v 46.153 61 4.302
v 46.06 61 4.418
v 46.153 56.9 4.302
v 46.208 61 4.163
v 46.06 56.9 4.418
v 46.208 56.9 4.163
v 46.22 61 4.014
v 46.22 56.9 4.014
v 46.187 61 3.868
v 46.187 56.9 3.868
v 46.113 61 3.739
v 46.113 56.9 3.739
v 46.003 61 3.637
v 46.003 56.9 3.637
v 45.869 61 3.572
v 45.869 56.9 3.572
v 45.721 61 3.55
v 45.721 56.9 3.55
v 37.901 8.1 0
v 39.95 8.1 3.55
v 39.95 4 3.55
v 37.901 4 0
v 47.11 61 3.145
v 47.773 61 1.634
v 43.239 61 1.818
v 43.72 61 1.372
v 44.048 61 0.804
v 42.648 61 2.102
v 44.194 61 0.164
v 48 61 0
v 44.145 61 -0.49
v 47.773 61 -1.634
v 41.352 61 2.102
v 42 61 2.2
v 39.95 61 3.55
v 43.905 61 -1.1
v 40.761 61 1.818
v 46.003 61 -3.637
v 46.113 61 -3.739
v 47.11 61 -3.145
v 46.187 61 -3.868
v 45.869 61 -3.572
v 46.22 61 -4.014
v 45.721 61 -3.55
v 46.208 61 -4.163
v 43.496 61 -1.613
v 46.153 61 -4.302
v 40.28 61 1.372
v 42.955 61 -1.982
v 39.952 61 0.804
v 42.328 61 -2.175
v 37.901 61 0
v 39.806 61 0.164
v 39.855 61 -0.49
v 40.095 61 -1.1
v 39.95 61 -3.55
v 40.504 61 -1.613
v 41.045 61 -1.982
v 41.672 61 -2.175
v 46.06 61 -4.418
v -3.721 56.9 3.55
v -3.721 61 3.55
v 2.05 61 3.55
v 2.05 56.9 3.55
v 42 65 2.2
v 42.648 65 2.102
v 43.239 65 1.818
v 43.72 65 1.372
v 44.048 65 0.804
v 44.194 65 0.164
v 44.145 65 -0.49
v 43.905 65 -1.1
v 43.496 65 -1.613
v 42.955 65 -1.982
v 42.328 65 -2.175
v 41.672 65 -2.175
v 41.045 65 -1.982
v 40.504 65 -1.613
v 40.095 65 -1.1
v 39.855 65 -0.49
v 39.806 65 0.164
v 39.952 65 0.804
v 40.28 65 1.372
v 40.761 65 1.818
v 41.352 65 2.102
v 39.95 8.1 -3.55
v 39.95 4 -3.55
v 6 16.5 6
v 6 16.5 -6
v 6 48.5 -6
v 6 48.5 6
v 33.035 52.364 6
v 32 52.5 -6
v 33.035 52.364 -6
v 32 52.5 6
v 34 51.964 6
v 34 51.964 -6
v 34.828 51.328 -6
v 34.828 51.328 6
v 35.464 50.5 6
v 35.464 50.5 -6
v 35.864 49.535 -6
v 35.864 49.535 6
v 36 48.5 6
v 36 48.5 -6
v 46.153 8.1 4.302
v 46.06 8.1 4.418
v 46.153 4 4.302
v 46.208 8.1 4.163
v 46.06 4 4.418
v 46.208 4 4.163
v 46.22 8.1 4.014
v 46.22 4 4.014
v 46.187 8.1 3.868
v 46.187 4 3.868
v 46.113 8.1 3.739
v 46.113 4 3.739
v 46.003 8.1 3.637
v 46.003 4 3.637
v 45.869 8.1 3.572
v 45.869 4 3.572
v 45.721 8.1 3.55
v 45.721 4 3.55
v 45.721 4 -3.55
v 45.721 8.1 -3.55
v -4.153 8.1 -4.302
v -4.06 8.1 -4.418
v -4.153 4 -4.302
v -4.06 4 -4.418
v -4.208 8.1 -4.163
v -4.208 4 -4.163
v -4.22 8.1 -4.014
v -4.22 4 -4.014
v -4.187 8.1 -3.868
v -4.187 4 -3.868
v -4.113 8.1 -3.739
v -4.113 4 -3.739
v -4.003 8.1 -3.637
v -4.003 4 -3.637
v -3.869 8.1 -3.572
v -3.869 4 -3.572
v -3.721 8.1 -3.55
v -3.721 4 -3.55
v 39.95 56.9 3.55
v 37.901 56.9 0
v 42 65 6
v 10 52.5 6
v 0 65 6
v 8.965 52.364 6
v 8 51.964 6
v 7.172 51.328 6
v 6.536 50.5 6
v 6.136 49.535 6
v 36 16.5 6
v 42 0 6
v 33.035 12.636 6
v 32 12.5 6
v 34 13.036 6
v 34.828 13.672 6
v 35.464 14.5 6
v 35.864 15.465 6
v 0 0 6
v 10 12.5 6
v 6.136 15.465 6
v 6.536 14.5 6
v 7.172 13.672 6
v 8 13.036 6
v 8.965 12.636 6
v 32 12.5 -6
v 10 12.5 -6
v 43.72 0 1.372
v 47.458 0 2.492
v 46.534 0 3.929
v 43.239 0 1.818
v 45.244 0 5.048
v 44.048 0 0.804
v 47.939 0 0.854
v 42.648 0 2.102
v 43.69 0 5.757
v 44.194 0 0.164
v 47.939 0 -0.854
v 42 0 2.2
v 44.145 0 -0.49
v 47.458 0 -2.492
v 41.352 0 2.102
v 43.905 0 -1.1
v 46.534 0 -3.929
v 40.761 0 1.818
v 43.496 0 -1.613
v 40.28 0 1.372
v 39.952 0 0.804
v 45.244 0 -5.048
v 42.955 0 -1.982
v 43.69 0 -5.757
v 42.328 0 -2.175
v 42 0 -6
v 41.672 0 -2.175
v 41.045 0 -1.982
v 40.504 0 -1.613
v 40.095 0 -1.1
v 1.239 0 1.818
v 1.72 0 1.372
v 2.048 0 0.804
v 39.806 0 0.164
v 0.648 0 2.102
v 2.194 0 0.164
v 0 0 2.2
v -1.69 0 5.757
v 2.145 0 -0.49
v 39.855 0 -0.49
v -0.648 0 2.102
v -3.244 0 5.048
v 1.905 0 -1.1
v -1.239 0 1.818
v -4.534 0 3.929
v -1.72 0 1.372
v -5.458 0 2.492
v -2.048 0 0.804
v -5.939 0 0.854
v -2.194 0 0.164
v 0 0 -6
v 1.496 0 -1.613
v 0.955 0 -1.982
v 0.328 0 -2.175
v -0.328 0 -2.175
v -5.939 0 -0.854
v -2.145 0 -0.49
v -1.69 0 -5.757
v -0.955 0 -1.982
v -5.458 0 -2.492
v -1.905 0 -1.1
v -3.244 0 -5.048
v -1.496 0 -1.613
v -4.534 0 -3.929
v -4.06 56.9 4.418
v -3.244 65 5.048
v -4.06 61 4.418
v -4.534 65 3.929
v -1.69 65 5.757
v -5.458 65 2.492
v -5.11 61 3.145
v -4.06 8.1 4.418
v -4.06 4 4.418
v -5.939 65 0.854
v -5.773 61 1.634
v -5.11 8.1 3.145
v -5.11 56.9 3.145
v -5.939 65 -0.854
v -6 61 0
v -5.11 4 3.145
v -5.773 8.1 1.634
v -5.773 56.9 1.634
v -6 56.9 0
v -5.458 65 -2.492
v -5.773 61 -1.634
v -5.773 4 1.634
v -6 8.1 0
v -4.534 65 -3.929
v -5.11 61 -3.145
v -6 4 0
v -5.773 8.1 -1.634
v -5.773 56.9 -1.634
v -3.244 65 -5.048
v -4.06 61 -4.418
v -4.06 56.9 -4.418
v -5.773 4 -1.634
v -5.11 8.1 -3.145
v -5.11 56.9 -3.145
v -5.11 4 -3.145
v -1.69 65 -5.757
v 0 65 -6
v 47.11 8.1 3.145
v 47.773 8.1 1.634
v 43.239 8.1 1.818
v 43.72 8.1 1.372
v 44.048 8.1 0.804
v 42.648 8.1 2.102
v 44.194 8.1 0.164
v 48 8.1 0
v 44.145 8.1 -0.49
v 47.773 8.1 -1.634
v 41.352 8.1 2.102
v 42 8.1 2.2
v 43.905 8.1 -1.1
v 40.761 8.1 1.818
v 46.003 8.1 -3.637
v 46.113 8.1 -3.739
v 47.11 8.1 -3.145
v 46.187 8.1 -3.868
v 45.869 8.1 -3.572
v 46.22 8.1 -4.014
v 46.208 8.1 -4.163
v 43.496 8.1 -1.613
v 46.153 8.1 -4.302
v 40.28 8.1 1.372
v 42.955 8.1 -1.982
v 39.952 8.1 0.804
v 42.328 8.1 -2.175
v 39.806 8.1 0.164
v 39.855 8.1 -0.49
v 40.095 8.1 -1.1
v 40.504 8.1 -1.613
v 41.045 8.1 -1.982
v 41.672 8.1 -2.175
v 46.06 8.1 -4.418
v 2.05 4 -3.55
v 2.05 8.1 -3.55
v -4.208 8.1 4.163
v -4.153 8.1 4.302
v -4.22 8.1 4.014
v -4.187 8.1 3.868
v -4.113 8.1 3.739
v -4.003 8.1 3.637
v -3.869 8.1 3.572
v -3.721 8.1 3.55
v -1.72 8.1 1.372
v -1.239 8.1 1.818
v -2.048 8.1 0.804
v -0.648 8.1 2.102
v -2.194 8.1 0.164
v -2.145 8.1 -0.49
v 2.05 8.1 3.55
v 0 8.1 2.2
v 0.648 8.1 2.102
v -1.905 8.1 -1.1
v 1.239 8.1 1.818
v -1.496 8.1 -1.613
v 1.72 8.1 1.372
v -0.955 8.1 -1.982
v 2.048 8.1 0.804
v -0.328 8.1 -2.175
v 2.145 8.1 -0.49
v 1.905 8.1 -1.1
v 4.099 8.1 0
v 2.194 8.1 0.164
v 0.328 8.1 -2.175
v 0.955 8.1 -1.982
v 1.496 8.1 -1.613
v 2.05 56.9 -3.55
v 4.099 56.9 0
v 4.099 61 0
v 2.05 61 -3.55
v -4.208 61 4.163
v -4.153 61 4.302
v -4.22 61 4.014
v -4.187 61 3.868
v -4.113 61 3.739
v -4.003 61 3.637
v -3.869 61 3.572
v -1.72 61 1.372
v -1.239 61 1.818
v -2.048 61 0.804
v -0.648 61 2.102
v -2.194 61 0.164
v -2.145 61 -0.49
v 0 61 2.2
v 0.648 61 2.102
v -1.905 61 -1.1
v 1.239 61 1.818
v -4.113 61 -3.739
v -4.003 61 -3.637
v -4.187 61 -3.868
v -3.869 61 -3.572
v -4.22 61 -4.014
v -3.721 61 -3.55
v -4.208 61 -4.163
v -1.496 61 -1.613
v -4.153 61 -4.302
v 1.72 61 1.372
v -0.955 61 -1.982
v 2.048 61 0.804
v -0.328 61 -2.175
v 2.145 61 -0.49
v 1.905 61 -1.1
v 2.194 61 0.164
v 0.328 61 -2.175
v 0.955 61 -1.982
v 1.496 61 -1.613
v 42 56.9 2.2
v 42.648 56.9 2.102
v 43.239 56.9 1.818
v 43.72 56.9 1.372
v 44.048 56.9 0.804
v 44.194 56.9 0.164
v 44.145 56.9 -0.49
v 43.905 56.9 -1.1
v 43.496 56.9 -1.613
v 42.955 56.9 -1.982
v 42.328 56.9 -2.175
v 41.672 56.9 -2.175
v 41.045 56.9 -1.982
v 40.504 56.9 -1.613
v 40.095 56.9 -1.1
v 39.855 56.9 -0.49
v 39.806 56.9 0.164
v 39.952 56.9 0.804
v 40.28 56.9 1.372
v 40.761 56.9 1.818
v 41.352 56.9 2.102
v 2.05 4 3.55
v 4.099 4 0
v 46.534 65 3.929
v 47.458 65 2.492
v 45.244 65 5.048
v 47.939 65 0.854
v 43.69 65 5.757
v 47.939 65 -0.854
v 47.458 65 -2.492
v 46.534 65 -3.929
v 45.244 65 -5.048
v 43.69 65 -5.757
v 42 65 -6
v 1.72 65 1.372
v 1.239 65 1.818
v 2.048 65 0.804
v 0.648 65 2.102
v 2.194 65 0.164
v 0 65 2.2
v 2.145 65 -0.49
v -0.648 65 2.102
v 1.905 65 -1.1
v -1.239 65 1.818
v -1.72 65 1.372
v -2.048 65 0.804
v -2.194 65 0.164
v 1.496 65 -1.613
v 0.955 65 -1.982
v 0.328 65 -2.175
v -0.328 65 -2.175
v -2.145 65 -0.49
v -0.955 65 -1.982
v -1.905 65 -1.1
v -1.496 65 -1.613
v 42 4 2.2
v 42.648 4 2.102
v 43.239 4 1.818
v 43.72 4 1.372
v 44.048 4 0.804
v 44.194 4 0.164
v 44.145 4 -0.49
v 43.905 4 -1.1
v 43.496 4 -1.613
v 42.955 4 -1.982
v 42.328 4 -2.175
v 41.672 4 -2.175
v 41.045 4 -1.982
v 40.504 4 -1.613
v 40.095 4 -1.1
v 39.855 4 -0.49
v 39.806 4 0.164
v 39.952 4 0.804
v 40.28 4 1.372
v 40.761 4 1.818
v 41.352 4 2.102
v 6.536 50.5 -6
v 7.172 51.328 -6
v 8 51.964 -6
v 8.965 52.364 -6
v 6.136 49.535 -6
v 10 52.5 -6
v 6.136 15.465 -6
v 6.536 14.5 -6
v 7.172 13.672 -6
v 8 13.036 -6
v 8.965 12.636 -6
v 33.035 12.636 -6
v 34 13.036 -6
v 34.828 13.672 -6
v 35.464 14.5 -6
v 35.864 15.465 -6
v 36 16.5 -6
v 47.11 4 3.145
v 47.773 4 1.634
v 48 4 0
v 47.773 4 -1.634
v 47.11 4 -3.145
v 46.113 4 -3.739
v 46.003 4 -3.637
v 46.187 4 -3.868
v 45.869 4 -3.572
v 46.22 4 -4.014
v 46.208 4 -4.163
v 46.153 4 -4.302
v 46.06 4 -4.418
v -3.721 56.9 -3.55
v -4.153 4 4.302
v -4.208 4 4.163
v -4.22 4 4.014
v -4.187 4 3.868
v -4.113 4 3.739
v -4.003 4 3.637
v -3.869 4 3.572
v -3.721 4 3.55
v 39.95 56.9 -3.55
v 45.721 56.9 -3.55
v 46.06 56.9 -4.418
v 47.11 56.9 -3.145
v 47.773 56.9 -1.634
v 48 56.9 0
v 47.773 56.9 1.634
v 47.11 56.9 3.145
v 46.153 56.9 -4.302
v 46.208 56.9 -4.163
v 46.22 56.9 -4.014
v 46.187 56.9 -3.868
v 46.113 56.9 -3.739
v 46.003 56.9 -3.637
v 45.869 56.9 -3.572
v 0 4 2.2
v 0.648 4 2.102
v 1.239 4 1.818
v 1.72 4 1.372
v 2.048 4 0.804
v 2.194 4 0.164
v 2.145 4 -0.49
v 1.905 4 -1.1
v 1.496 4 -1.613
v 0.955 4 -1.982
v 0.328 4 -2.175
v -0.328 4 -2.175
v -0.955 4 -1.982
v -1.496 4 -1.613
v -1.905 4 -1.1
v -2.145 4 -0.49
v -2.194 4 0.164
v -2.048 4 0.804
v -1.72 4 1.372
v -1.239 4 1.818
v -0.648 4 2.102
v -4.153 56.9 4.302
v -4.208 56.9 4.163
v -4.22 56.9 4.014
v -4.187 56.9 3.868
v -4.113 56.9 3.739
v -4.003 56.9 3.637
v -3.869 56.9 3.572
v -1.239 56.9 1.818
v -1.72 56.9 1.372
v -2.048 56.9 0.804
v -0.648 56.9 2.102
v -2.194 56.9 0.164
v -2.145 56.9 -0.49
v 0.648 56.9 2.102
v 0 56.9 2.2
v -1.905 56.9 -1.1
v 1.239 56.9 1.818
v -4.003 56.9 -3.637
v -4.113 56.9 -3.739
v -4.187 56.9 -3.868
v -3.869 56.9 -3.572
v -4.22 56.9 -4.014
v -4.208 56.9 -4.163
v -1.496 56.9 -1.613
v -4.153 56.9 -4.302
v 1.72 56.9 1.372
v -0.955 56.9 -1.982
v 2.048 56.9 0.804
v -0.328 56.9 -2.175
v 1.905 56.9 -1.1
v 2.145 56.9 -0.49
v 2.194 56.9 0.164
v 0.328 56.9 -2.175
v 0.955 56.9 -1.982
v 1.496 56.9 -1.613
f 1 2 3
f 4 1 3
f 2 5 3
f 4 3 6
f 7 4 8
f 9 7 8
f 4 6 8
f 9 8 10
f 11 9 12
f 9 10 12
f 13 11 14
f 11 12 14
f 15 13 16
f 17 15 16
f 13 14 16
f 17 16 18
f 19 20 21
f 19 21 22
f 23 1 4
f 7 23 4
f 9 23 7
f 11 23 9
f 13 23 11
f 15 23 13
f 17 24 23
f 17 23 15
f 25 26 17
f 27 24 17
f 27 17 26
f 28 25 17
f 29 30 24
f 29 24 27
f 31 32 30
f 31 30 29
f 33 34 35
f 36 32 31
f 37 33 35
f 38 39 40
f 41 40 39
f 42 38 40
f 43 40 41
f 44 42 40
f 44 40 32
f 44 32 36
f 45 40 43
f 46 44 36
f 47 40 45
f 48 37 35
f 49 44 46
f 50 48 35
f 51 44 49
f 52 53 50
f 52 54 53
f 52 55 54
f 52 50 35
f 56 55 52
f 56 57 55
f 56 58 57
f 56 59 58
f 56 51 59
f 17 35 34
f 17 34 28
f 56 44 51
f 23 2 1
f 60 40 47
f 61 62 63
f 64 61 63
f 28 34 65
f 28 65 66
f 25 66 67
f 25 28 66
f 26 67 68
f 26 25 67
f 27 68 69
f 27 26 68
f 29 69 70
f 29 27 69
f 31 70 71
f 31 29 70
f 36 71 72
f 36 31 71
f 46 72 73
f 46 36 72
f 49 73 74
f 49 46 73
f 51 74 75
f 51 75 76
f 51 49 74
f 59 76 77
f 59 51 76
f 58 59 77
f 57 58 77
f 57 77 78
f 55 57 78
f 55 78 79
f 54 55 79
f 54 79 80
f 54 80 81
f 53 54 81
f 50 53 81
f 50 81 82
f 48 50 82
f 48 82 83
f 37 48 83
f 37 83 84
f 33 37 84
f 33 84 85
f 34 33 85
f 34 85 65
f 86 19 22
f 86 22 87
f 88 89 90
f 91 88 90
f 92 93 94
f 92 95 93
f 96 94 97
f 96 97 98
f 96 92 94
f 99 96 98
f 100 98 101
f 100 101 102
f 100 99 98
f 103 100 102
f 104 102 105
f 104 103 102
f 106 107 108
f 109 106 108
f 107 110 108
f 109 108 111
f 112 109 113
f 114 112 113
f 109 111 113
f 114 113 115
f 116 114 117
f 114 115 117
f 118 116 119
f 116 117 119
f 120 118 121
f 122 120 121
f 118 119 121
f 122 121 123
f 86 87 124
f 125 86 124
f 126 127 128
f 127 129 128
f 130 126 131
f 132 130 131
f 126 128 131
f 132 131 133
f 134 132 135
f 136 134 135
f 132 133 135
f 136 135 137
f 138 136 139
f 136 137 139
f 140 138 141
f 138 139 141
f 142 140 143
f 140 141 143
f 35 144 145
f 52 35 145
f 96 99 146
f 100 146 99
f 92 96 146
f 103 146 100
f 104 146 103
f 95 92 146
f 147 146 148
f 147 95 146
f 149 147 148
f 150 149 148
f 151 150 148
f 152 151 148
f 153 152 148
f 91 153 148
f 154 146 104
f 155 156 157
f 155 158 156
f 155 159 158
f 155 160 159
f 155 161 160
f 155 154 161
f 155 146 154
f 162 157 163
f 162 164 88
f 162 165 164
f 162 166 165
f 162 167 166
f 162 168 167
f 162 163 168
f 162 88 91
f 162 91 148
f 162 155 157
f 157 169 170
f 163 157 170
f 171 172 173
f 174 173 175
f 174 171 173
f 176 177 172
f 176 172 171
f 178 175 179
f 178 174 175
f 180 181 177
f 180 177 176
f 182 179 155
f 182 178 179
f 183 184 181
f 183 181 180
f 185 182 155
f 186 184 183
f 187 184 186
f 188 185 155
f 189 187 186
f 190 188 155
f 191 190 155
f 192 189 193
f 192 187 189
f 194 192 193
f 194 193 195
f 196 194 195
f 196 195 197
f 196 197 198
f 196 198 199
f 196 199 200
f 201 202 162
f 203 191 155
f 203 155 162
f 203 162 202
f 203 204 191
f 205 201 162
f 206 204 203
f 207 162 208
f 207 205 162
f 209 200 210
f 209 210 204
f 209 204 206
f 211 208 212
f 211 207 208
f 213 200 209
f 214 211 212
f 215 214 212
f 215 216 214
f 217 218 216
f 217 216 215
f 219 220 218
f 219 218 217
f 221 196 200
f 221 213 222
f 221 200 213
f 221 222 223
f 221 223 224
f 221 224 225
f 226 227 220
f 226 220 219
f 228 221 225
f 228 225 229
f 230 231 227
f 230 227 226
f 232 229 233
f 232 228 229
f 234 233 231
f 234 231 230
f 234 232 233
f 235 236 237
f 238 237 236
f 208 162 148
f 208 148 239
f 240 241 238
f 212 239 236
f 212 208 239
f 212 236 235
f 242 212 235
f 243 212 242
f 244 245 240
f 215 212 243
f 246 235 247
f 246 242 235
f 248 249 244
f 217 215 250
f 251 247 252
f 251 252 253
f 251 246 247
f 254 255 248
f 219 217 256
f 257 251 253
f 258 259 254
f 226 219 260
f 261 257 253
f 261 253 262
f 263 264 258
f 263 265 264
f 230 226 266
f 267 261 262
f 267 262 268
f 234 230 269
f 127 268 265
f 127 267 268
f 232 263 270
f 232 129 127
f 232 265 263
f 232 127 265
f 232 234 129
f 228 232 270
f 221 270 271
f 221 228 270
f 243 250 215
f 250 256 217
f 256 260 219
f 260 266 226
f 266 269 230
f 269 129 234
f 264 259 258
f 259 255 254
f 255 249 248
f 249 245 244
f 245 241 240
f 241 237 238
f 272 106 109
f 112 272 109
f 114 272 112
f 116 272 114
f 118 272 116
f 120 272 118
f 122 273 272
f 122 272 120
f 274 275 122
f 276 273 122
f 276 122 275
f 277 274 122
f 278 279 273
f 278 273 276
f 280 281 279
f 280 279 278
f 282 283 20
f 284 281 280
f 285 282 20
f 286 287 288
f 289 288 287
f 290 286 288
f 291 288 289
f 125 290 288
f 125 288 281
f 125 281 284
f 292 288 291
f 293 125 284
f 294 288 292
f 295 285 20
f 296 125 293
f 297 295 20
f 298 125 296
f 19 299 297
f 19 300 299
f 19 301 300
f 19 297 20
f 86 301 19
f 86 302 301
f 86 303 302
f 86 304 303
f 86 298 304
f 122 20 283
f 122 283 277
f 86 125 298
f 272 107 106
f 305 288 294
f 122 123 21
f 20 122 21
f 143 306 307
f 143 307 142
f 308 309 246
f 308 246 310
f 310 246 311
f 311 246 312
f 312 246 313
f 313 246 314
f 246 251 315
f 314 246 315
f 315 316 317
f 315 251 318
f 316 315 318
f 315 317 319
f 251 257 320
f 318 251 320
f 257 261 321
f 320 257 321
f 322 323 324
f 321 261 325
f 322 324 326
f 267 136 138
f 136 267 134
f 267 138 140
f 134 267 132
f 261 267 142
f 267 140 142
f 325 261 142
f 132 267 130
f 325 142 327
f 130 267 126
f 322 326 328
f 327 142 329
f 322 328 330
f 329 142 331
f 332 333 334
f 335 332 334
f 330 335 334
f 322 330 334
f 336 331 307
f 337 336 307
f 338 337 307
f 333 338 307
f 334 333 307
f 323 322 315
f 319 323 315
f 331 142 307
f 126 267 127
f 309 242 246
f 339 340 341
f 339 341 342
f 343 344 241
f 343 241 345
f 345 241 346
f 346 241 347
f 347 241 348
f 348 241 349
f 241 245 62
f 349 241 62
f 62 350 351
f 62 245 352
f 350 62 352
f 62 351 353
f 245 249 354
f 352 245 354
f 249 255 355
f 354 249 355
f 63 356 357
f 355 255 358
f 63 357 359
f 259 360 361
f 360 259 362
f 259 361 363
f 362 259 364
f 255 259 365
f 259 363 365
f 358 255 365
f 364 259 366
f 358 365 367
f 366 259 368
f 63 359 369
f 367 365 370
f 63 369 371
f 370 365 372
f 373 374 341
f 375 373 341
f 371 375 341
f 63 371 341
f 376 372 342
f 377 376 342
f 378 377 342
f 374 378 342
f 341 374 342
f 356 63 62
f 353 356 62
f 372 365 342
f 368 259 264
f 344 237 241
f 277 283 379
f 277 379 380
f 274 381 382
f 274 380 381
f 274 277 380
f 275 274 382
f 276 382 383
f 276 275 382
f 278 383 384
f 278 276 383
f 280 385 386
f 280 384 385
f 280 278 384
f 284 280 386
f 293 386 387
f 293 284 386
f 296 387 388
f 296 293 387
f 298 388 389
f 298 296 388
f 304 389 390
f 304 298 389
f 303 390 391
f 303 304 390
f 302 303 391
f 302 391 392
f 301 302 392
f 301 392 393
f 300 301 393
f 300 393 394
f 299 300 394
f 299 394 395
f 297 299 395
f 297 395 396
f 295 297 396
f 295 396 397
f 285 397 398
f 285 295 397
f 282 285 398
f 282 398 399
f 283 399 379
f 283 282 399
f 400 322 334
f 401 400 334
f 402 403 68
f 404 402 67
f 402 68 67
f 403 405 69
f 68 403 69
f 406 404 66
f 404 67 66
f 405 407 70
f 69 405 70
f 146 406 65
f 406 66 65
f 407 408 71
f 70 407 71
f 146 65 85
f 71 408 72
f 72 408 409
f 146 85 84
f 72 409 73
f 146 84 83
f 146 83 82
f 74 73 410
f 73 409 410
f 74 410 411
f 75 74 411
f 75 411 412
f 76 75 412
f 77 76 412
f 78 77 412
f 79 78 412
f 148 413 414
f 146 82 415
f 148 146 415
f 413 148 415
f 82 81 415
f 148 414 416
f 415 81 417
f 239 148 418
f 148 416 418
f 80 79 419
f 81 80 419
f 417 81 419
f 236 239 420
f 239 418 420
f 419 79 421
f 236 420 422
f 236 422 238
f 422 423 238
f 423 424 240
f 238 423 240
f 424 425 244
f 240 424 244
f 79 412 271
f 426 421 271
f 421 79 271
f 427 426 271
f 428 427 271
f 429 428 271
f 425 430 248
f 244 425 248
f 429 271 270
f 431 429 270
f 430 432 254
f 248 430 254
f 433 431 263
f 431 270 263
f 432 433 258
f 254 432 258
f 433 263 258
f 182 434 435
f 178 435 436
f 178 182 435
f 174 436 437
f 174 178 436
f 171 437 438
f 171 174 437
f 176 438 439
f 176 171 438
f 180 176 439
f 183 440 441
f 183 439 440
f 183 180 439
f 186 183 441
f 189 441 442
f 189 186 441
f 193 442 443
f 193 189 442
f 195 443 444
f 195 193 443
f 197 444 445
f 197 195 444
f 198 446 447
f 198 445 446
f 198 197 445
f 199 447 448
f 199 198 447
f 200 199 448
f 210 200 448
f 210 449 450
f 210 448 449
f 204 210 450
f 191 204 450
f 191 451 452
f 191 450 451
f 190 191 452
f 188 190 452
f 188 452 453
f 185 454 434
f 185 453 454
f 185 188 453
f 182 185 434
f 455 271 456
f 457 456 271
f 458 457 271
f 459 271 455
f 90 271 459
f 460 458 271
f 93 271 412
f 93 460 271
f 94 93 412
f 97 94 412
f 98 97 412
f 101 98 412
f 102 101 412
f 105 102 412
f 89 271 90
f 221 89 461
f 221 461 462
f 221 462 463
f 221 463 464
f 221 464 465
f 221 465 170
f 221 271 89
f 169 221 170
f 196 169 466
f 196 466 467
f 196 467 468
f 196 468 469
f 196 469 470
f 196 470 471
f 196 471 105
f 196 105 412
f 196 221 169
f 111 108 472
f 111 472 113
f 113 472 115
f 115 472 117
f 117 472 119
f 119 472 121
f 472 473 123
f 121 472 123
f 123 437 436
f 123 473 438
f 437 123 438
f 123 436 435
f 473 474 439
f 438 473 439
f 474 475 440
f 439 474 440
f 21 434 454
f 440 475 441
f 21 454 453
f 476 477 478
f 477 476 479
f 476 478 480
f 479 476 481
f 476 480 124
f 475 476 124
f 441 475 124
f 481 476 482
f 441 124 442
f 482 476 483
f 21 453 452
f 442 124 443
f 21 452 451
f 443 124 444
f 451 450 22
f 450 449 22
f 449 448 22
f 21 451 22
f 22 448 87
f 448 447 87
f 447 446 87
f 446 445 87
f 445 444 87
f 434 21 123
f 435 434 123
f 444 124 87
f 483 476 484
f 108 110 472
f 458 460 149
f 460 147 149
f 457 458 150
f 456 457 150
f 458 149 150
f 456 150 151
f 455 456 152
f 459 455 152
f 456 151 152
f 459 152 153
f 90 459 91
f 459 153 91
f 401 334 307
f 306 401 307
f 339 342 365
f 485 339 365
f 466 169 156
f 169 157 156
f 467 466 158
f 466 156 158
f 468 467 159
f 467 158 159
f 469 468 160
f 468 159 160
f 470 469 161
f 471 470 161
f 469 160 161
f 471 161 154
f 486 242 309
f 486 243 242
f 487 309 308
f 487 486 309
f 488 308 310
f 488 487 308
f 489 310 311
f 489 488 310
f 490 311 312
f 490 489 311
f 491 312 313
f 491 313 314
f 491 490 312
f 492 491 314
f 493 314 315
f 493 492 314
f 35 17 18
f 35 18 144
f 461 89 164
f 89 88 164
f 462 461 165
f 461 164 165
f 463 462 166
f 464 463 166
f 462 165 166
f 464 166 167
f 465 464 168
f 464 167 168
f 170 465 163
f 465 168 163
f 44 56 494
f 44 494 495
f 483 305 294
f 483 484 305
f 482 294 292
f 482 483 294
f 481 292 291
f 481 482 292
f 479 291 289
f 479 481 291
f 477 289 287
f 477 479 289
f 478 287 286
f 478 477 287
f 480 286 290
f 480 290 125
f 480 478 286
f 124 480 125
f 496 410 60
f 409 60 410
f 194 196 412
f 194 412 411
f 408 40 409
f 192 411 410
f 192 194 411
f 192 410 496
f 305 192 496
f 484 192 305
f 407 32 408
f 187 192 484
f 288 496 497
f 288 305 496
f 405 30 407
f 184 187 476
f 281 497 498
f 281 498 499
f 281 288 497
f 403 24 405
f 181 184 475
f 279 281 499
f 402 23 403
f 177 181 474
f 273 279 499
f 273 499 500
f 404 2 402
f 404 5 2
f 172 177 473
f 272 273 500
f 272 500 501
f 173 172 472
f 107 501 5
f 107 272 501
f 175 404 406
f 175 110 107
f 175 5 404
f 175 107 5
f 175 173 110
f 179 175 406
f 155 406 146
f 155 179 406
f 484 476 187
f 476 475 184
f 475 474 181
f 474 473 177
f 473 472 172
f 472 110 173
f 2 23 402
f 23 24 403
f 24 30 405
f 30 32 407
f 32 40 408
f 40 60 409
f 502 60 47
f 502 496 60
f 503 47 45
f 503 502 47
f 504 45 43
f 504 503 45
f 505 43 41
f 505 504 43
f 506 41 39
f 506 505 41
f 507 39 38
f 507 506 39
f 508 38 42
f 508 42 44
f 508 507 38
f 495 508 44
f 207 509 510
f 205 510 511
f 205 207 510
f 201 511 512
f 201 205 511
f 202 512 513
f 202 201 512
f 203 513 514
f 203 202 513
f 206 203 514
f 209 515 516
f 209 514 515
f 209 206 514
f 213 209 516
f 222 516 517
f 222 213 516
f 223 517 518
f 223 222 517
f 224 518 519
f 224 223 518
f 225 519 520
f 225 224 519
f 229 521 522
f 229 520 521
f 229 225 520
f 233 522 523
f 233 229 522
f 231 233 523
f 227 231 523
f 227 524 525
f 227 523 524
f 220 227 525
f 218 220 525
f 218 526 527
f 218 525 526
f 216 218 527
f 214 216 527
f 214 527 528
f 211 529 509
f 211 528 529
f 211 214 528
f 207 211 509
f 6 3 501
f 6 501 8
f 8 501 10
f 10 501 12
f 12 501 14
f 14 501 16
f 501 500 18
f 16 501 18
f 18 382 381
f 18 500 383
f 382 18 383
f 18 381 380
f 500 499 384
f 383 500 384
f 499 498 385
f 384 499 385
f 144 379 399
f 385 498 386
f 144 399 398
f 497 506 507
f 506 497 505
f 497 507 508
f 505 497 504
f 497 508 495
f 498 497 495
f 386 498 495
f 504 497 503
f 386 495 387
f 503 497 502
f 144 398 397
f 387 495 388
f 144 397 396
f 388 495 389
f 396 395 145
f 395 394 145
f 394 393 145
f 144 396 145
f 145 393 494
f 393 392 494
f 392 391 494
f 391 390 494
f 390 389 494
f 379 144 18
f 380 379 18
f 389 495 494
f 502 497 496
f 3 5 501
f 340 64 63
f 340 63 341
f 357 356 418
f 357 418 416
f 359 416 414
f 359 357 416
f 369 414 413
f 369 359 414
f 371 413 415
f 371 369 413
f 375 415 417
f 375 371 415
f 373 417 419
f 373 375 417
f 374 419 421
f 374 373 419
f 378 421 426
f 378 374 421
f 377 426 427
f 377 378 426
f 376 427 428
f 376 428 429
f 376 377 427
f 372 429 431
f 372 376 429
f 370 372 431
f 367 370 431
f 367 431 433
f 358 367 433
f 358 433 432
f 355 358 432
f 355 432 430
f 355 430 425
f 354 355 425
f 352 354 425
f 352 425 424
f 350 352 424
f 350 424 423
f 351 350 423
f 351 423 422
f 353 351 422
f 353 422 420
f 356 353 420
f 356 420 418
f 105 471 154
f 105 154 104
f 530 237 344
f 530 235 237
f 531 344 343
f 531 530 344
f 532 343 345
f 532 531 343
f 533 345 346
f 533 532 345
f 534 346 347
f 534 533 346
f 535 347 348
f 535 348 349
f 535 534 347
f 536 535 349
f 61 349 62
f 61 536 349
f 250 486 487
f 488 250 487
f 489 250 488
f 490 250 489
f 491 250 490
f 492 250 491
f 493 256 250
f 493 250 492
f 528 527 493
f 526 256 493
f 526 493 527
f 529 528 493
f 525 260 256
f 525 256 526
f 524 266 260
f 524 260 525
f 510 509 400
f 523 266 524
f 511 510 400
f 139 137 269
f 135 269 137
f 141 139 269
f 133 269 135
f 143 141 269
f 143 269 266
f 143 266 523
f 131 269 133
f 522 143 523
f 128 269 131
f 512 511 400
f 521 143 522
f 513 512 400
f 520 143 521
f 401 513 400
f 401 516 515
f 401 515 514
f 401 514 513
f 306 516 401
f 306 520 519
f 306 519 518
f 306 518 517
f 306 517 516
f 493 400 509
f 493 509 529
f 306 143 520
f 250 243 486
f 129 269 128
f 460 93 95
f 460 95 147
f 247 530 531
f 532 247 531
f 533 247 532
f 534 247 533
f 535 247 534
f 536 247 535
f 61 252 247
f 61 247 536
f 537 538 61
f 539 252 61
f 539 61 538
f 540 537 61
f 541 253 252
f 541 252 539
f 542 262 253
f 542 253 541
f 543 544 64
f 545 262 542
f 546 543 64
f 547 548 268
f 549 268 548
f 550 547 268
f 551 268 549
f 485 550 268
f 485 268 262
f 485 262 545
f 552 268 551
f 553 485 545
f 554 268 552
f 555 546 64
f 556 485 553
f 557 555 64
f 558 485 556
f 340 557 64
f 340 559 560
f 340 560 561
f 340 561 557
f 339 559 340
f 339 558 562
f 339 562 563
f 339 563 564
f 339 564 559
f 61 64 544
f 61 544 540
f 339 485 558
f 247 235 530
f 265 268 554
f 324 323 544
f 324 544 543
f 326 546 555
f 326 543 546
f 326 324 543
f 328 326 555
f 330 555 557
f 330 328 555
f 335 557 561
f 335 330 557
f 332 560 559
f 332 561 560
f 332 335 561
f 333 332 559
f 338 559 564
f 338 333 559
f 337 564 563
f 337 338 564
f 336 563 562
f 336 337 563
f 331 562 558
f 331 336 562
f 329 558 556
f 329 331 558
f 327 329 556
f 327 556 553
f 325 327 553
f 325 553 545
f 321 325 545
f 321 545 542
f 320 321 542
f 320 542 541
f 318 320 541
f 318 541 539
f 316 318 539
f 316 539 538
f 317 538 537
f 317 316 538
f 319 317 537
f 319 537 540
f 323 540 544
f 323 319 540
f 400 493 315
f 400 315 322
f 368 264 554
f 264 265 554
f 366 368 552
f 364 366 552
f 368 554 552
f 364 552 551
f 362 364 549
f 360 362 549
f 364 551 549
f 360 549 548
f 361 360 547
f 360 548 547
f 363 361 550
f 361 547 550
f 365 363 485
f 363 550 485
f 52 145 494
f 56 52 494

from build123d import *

# Parameters (mm, degrees)
SKETCH1_R            = 2.2
BOSS_EXTRUDE1_DEPTH  = 65
CUT_EXTRUDE1_DEPTH   = 4.1
FILLET1_R            = 0.5
FILLET1_OF_MIRROR1_R = 0.5
SKETCH4_W            = 30
SKETCH4_H            = 40
CUT_EXTRUDE2_DEPTH   = 82.688432474
FILLET2_R            = 4


with BuildPart() as part:
    # Sketch1 → Boss-Extrude1 (new body)
    with BuildSketch(Plane(origin=(0, 0, 0), x_dir=(1, 0, 0), z_dir=(0, 1, 0))):
        with BuildLine():
            Line((0, 6), (42, 6))
            ThreePointArc((42, 6), (48, 0), (42, -6))
            Line((42, -6), (0, -6))
            ThreePointArc((0, -6), (-6, 0), (0, 6))
        make_face()
        with Locations(Location((0, 0, 0), (0, 0, 270))):
            Circle(SKETCH1_R, mode=Mode.SUBTRACT)
        with Locations(Location((42, 0, 0), (0, 0, 270))):
            Circle(SKETCH1_R, mode=Mode.SUBTRACT)
    extrude(amount=BOSS_EXTRUDE1_DEPTH)

    # Sketch3 → Cut-Extrude1 (cut)
    with BuildSketch(Plane(origin=(0, 61, 0), x_dir=(1, 0, 0), z_dir=(0, 1, 0))):
        Polygon((4.099186911, 0), (2.049593456, 3.55), (-9.046065911, 3.55), (-8.518024666, -3.55), (2.049593456, -3.55), align=None)
        Polygon((39.950406544, 3.55), (51.046065911, 3.55), (50.518024666, -3.55), (39.950406544, -3.55), (37.900813089, 0), align=None)
    cut_extrude1 = extrude(amount=-CUT_EXTRUDE1_DEPTH, mode=Mode.SUBTRACT)

    # Fillet1
    fillet1_edges = [part.edges().sort_by_distance(p)[0] for p in [
        (46.837096236, 58.95, 3.55),
        (46.837096236, 58.95, -3.55),
        (-4.837096236, 58.95, -3.55),
        (-4.837096236, 58.95, 3.55),
    ]]
    fillet(fillet1_edges, radius=FILLET1_R)

    # Mirror1: Cut-Extrude1 across plane
    add(cut_extrude1.mirror(Plane.ZX.offset(32.5)), mode=Mode.SUBTRACT)

    # Fillet1 of Mirror1
    fillet1_of_mirror1_edges = [part.edges().sort_by_distance(p)[0] for p in [
        (46.837096236, 6.05, 3.55),
        (46.837096236, 6.05, -3.55),
        (-4.837096236, 6.05, -3.55),
        (-4.837096236, 6.05, 3.55),
    ]]
    fillet(fillet1_of_mirror1_edges, radius=FILLET1_OF_MIRROR1_R)

    # Sketch4 → Cut-Extrude2 (cut, through all)
    with BuildSketch(Plane(origin=(0, 0, -6), x_dir=(-1, 0, 0), z_dir=(0, 0, -1))):
        with Locations((-21, 32.5)):
            Rectangle(SKETCH4_W, SKETCH4_H)
    extrude(amount=-CUT_EXTRUDE2_DEPTH, mode=Mode.SUBTRACT)

    # Fillet2
    fillet2_edges = [part.edges().sort_by_distance(p)[0] for p in [
        (6, 52.5, 0),
        (6, 12.5, 0),
        (36, 12.5, 0),
        (36, 52.5, 0),
    ]]
    fillet(fillet2_edges, radius=FILLET2_R)


solid = part.part
